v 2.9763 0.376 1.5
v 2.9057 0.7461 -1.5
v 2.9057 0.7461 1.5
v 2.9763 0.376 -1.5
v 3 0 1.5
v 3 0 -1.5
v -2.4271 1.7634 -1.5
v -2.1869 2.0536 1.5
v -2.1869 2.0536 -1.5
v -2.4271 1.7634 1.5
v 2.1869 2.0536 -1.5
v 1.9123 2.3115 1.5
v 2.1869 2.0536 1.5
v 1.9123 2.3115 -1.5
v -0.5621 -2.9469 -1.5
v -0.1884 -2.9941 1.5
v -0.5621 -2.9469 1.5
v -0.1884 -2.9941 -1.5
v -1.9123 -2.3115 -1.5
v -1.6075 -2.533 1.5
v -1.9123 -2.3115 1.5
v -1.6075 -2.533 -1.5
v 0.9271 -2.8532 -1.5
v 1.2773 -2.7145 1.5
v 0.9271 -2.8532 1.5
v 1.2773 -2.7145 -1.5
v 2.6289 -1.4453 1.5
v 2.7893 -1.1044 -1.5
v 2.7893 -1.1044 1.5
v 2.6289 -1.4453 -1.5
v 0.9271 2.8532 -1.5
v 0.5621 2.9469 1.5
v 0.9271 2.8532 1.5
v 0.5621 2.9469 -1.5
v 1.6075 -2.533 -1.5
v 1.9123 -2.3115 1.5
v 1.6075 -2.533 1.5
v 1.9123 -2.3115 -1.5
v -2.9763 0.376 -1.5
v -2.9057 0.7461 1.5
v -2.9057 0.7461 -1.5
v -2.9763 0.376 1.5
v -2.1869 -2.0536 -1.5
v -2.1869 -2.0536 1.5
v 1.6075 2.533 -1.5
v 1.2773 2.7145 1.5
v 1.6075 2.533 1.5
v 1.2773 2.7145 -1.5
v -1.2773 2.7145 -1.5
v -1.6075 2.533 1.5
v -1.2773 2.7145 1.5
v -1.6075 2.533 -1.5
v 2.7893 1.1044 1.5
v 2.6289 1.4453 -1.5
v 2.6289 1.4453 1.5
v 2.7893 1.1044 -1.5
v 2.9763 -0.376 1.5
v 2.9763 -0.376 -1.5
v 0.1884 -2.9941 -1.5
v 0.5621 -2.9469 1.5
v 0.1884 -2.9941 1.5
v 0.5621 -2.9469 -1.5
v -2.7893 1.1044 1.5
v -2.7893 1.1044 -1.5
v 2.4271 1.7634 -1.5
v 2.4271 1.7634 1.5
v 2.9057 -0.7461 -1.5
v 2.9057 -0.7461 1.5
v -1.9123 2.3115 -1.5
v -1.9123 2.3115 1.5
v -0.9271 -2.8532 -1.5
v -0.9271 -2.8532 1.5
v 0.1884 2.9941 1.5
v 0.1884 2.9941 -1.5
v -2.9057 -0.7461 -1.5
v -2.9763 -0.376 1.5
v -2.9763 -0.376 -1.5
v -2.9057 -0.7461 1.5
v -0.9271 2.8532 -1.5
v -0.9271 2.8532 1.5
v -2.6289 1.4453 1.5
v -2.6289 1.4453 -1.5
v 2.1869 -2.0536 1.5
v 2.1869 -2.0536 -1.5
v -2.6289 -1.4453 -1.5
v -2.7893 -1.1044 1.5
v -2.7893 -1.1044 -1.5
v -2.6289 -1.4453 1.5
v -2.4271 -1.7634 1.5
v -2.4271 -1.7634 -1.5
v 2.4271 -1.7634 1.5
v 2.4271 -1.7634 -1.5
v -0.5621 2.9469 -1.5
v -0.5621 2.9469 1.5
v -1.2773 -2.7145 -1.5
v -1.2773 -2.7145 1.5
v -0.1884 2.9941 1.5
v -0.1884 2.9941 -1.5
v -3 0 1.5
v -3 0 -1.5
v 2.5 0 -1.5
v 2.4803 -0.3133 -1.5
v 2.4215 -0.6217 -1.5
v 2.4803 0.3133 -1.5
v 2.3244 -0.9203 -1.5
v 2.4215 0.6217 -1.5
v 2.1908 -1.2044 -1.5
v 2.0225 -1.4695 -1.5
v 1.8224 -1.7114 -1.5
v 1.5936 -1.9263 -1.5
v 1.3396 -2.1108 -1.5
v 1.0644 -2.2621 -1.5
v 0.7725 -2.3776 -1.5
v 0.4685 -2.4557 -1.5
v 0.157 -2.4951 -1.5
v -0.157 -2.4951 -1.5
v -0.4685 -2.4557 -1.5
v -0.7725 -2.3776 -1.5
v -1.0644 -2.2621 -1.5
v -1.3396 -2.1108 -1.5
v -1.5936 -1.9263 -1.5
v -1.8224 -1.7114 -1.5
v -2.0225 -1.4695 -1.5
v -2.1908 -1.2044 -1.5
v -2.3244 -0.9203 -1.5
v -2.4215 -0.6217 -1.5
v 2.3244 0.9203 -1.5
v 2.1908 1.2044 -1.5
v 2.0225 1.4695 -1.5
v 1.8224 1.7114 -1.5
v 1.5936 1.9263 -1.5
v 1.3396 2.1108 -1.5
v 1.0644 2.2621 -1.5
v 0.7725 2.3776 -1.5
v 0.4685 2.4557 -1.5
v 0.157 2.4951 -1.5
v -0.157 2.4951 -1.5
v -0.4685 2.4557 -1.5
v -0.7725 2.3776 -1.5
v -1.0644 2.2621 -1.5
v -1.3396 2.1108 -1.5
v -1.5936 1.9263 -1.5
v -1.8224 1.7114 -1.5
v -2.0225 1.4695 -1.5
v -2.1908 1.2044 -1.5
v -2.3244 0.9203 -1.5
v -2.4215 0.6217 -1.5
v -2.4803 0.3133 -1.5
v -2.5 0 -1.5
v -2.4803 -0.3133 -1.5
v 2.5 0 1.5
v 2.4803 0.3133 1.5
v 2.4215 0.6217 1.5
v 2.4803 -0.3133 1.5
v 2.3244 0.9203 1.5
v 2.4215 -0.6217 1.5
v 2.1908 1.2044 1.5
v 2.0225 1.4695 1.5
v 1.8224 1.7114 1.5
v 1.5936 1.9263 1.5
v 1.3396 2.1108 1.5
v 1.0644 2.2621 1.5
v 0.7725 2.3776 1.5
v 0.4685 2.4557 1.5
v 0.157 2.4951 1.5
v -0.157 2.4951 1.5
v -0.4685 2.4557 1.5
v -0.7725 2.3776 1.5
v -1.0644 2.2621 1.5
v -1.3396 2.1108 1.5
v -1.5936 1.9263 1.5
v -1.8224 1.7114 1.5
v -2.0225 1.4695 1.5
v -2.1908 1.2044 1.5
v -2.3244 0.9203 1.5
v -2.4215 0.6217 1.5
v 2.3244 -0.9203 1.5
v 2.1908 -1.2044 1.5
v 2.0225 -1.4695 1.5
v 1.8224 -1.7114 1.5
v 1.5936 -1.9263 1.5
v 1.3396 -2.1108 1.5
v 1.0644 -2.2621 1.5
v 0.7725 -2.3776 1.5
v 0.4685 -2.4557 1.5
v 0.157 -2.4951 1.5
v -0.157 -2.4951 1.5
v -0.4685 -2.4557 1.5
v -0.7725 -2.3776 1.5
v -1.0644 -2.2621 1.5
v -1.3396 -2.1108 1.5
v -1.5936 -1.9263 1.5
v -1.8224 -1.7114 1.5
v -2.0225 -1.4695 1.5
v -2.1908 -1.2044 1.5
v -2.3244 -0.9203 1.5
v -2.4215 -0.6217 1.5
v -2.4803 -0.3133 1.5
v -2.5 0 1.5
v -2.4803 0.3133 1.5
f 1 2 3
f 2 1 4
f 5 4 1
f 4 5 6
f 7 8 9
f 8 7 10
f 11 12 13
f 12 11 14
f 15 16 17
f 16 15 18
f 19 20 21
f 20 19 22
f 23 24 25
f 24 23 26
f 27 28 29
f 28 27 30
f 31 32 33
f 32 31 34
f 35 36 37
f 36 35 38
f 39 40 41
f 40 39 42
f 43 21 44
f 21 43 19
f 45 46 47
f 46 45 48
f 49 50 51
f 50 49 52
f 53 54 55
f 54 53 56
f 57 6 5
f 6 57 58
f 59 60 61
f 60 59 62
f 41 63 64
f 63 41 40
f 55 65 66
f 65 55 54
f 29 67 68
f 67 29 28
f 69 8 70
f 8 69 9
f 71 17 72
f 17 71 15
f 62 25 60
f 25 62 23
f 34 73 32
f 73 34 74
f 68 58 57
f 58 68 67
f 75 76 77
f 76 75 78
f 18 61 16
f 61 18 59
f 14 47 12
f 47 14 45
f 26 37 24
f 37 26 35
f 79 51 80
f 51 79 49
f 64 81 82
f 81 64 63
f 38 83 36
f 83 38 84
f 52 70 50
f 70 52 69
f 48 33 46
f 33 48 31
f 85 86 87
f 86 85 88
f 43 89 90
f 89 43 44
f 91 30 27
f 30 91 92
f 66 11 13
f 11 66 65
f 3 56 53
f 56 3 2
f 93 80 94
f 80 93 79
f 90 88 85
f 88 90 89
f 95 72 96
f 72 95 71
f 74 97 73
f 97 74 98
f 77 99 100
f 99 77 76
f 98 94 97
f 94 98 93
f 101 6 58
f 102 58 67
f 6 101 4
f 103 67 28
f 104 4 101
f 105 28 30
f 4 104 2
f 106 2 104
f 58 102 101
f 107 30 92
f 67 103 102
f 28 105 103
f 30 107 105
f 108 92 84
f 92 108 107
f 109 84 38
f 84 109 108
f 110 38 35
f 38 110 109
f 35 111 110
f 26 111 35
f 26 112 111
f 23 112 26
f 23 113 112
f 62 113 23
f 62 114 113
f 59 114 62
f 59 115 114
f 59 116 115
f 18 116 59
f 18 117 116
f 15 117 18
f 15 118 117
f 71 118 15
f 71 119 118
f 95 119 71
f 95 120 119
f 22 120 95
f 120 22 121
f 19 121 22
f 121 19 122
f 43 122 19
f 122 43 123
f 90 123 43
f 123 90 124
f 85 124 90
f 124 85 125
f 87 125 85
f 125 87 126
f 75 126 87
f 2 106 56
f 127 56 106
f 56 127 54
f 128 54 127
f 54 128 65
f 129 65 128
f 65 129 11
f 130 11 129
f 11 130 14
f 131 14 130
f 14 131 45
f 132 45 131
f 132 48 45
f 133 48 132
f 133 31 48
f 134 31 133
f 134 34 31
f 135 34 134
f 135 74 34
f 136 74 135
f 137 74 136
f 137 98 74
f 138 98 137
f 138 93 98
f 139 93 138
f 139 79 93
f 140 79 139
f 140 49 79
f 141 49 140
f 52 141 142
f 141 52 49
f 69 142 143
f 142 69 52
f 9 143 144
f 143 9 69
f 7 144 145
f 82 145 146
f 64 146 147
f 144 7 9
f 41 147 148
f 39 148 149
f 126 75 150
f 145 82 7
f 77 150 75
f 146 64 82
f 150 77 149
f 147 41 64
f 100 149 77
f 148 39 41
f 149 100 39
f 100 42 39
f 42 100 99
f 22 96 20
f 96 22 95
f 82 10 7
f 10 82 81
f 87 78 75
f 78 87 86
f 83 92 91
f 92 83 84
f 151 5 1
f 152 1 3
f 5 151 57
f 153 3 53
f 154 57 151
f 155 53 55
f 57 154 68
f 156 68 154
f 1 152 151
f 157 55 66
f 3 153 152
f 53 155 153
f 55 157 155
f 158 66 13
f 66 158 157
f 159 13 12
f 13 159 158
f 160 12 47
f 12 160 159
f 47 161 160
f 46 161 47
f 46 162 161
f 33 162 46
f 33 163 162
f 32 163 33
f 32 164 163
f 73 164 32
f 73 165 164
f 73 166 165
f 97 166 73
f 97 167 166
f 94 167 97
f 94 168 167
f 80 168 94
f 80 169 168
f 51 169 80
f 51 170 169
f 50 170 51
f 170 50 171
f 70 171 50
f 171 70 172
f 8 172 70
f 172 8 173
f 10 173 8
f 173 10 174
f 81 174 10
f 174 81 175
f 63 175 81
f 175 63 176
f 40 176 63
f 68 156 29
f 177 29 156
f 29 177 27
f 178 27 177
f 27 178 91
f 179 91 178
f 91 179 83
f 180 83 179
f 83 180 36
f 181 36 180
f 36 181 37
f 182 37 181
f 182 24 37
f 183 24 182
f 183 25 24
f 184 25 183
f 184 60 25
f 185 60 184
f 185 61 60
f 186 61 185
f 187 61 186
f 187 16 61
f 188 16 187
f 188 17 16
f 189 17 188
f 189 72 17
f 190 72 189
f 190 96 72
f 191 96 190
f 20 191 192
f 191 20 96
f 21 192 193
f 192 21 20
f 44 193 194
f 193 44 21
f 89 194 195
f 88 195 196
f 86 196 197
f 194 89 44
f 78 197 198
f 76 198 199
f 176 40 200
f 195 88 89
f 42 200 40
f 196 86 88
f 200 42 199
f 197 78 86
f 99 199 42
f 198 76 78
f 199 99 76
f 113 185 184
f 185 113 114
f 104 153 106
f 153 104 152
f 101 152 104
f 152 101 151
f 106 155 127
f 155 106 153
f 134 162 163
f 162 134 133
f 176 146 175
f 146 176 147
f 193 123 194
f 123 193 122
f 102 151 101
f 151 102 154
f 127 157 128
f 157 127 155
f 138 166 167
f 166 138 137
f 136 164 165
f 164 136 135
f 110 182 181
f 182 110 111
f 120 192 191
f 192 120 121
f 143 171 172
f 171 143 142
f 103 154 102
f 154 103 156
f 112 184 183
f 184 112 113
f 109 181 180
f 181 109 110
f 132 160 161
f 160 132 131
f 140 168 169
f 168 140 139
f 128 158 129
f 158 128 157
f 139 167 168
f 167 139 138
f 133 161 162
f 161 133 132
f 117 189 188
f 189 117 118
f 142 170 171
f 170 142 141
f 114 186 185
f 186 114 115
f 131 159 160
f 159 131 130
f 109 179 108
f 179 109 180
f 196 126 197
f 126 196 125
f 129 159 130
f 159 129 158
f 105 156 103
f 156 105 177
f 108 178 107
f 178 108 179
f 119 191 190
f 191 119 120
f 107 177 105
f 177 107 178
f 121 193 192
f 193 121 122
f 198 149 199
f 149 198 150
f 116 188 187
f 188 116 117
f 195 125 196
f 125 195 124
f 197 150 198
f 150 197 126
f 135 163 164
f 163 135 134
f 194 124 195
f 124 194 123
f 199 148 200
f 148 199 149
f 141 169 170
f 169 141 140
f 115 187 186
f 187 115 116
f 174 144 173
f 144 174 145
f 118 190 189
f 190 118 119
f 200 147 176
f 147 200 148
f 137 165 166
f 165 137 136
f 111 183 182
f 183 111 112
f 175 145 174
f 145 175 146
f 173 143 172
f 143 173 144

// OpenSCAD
$fn = 50;


difference() {
	union() {
		translate(v = [0, 0, -1.5000000000]) {
			cylinder(h = 3, r = 3.0000000000);
		}
	}
	union() {
		translate(v = [0, 0, -100.0000000000]) {
			cylinder(h = 200, r = 2.5000000000);
		}
	}
}
